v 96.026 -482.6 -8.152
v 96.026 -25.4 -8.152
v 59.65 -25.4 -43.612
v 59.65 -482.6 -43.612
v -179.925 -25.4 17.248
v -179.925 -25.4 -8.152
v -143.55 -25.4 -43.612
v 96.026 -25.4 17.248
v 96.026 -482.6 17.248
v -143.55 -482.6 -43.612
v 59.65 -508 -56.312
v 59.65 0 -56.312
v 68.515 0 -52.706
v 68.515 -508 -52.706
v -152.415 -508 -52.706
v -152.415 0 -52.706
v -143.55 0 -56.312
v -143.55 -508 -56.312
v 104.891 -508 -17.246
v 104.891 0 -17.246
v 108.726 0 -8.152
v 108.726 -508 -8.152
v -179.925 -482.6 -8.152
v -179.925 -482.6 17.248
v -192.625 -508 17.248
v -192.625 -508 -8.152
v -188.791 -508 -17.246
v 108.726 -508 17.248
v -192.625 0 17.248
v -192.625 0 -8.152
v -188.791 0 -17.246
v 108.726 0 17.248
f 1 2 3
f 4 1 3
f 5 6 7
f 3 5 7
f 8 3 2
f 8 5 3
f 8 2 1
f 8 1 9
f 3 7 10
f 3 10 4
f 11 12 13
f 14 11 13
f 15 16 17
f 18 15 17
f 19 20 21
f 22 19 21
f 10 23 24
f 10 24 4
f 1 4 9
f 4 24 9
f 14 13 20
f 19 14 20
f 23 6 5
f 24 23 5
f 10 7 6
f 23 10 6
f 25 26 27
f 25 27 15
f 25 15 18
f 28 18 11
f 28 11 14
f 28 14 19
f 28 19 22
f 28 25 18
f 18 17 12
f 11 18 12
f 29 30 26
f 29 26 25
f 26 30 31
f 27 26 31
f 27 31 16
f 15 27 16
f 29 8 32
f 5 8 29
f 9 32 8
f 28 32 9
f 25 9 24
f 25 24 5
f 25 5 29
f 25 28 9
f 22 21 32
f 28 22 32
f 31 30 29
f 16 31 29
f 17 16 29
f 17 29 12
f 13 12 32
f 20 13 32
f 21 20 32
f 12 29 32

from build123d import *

# Parameters (mm, degrees)
F0_W     = 12.7
F0_H     = 25.4
F0_W_2   = 203.2
F0_H_2   = 12.7
F1_DEPTH = 508
F3_DEPTH = 25.4
F5_DEPTH = 25.4


with BuildPart() as f1:
    # F0 (on Front) → F1 (new body)
    with BuildSketch(Plane.XZ):
        with Locations((102.376167, 4.548111)):
            Rectangle(F0_W, F0_H)
        Polygon((104.891275, -17.245835), (96.026167, -8.151889), (59.65038, -43.612319), (68.515488, -52.706266), align=None)
        Polygon((108.726167, -8.151889), (96.026167, -8.151889), (104.891275, -17.245835), align=None)
        with Locations((-41.94962, -49.962319)):
            Rectangle(F0_W_2, F0_H_2)
        Polygon((68.515488, -52.706266), (59.65038, -43.612319), (59.65038, -56.312319), align=None)
        Polygon((-152.414727, -52.706266), (-143.54962, -43.612319), (-179.925407, -8.151889), (-188.790514, -17.245835), align=None)
        Polygon((-143.54962, -56.312319), (-143.54962, -43.612319), (-152.414727, -52.706266), align=None)
        with Locations((-186.275407, 4.548111)):
            Rectangle(F0_W, F0_H)
        Polygon((-188.790514, -17.245835), (-179.925407, -8.151889), (-192.625407, -8.151889), align=None)
    extrude(amount=F1_DEPTH)

    # F2 (on Front) → F3 (join)
    with BuildSketch(Plane.XZ):
        Polygon((96.026167, 17.248111), (-179.925407, 17.248111), (-179.925407, -8.151889), (-143.54962, -43.612319), (59.65038, -43.612319), (96.026167, -8.151889), align=None)
    extrude(amount=F3_DEPTH)

    # F4 (on face) → F5 (join)
    with BuildSketch(Plane.XZ.offset(508)):
        Polygon((96.026167, 17.248111), (-179.925407, 17.248111), (-179.925407, -8.151889), (-143.54962, -43.612319), (59.65038, -43.612319), (96.026167, -8.151889), align=None)
    extrude(amount=-F5_DEPTH)


solid = f1.part
